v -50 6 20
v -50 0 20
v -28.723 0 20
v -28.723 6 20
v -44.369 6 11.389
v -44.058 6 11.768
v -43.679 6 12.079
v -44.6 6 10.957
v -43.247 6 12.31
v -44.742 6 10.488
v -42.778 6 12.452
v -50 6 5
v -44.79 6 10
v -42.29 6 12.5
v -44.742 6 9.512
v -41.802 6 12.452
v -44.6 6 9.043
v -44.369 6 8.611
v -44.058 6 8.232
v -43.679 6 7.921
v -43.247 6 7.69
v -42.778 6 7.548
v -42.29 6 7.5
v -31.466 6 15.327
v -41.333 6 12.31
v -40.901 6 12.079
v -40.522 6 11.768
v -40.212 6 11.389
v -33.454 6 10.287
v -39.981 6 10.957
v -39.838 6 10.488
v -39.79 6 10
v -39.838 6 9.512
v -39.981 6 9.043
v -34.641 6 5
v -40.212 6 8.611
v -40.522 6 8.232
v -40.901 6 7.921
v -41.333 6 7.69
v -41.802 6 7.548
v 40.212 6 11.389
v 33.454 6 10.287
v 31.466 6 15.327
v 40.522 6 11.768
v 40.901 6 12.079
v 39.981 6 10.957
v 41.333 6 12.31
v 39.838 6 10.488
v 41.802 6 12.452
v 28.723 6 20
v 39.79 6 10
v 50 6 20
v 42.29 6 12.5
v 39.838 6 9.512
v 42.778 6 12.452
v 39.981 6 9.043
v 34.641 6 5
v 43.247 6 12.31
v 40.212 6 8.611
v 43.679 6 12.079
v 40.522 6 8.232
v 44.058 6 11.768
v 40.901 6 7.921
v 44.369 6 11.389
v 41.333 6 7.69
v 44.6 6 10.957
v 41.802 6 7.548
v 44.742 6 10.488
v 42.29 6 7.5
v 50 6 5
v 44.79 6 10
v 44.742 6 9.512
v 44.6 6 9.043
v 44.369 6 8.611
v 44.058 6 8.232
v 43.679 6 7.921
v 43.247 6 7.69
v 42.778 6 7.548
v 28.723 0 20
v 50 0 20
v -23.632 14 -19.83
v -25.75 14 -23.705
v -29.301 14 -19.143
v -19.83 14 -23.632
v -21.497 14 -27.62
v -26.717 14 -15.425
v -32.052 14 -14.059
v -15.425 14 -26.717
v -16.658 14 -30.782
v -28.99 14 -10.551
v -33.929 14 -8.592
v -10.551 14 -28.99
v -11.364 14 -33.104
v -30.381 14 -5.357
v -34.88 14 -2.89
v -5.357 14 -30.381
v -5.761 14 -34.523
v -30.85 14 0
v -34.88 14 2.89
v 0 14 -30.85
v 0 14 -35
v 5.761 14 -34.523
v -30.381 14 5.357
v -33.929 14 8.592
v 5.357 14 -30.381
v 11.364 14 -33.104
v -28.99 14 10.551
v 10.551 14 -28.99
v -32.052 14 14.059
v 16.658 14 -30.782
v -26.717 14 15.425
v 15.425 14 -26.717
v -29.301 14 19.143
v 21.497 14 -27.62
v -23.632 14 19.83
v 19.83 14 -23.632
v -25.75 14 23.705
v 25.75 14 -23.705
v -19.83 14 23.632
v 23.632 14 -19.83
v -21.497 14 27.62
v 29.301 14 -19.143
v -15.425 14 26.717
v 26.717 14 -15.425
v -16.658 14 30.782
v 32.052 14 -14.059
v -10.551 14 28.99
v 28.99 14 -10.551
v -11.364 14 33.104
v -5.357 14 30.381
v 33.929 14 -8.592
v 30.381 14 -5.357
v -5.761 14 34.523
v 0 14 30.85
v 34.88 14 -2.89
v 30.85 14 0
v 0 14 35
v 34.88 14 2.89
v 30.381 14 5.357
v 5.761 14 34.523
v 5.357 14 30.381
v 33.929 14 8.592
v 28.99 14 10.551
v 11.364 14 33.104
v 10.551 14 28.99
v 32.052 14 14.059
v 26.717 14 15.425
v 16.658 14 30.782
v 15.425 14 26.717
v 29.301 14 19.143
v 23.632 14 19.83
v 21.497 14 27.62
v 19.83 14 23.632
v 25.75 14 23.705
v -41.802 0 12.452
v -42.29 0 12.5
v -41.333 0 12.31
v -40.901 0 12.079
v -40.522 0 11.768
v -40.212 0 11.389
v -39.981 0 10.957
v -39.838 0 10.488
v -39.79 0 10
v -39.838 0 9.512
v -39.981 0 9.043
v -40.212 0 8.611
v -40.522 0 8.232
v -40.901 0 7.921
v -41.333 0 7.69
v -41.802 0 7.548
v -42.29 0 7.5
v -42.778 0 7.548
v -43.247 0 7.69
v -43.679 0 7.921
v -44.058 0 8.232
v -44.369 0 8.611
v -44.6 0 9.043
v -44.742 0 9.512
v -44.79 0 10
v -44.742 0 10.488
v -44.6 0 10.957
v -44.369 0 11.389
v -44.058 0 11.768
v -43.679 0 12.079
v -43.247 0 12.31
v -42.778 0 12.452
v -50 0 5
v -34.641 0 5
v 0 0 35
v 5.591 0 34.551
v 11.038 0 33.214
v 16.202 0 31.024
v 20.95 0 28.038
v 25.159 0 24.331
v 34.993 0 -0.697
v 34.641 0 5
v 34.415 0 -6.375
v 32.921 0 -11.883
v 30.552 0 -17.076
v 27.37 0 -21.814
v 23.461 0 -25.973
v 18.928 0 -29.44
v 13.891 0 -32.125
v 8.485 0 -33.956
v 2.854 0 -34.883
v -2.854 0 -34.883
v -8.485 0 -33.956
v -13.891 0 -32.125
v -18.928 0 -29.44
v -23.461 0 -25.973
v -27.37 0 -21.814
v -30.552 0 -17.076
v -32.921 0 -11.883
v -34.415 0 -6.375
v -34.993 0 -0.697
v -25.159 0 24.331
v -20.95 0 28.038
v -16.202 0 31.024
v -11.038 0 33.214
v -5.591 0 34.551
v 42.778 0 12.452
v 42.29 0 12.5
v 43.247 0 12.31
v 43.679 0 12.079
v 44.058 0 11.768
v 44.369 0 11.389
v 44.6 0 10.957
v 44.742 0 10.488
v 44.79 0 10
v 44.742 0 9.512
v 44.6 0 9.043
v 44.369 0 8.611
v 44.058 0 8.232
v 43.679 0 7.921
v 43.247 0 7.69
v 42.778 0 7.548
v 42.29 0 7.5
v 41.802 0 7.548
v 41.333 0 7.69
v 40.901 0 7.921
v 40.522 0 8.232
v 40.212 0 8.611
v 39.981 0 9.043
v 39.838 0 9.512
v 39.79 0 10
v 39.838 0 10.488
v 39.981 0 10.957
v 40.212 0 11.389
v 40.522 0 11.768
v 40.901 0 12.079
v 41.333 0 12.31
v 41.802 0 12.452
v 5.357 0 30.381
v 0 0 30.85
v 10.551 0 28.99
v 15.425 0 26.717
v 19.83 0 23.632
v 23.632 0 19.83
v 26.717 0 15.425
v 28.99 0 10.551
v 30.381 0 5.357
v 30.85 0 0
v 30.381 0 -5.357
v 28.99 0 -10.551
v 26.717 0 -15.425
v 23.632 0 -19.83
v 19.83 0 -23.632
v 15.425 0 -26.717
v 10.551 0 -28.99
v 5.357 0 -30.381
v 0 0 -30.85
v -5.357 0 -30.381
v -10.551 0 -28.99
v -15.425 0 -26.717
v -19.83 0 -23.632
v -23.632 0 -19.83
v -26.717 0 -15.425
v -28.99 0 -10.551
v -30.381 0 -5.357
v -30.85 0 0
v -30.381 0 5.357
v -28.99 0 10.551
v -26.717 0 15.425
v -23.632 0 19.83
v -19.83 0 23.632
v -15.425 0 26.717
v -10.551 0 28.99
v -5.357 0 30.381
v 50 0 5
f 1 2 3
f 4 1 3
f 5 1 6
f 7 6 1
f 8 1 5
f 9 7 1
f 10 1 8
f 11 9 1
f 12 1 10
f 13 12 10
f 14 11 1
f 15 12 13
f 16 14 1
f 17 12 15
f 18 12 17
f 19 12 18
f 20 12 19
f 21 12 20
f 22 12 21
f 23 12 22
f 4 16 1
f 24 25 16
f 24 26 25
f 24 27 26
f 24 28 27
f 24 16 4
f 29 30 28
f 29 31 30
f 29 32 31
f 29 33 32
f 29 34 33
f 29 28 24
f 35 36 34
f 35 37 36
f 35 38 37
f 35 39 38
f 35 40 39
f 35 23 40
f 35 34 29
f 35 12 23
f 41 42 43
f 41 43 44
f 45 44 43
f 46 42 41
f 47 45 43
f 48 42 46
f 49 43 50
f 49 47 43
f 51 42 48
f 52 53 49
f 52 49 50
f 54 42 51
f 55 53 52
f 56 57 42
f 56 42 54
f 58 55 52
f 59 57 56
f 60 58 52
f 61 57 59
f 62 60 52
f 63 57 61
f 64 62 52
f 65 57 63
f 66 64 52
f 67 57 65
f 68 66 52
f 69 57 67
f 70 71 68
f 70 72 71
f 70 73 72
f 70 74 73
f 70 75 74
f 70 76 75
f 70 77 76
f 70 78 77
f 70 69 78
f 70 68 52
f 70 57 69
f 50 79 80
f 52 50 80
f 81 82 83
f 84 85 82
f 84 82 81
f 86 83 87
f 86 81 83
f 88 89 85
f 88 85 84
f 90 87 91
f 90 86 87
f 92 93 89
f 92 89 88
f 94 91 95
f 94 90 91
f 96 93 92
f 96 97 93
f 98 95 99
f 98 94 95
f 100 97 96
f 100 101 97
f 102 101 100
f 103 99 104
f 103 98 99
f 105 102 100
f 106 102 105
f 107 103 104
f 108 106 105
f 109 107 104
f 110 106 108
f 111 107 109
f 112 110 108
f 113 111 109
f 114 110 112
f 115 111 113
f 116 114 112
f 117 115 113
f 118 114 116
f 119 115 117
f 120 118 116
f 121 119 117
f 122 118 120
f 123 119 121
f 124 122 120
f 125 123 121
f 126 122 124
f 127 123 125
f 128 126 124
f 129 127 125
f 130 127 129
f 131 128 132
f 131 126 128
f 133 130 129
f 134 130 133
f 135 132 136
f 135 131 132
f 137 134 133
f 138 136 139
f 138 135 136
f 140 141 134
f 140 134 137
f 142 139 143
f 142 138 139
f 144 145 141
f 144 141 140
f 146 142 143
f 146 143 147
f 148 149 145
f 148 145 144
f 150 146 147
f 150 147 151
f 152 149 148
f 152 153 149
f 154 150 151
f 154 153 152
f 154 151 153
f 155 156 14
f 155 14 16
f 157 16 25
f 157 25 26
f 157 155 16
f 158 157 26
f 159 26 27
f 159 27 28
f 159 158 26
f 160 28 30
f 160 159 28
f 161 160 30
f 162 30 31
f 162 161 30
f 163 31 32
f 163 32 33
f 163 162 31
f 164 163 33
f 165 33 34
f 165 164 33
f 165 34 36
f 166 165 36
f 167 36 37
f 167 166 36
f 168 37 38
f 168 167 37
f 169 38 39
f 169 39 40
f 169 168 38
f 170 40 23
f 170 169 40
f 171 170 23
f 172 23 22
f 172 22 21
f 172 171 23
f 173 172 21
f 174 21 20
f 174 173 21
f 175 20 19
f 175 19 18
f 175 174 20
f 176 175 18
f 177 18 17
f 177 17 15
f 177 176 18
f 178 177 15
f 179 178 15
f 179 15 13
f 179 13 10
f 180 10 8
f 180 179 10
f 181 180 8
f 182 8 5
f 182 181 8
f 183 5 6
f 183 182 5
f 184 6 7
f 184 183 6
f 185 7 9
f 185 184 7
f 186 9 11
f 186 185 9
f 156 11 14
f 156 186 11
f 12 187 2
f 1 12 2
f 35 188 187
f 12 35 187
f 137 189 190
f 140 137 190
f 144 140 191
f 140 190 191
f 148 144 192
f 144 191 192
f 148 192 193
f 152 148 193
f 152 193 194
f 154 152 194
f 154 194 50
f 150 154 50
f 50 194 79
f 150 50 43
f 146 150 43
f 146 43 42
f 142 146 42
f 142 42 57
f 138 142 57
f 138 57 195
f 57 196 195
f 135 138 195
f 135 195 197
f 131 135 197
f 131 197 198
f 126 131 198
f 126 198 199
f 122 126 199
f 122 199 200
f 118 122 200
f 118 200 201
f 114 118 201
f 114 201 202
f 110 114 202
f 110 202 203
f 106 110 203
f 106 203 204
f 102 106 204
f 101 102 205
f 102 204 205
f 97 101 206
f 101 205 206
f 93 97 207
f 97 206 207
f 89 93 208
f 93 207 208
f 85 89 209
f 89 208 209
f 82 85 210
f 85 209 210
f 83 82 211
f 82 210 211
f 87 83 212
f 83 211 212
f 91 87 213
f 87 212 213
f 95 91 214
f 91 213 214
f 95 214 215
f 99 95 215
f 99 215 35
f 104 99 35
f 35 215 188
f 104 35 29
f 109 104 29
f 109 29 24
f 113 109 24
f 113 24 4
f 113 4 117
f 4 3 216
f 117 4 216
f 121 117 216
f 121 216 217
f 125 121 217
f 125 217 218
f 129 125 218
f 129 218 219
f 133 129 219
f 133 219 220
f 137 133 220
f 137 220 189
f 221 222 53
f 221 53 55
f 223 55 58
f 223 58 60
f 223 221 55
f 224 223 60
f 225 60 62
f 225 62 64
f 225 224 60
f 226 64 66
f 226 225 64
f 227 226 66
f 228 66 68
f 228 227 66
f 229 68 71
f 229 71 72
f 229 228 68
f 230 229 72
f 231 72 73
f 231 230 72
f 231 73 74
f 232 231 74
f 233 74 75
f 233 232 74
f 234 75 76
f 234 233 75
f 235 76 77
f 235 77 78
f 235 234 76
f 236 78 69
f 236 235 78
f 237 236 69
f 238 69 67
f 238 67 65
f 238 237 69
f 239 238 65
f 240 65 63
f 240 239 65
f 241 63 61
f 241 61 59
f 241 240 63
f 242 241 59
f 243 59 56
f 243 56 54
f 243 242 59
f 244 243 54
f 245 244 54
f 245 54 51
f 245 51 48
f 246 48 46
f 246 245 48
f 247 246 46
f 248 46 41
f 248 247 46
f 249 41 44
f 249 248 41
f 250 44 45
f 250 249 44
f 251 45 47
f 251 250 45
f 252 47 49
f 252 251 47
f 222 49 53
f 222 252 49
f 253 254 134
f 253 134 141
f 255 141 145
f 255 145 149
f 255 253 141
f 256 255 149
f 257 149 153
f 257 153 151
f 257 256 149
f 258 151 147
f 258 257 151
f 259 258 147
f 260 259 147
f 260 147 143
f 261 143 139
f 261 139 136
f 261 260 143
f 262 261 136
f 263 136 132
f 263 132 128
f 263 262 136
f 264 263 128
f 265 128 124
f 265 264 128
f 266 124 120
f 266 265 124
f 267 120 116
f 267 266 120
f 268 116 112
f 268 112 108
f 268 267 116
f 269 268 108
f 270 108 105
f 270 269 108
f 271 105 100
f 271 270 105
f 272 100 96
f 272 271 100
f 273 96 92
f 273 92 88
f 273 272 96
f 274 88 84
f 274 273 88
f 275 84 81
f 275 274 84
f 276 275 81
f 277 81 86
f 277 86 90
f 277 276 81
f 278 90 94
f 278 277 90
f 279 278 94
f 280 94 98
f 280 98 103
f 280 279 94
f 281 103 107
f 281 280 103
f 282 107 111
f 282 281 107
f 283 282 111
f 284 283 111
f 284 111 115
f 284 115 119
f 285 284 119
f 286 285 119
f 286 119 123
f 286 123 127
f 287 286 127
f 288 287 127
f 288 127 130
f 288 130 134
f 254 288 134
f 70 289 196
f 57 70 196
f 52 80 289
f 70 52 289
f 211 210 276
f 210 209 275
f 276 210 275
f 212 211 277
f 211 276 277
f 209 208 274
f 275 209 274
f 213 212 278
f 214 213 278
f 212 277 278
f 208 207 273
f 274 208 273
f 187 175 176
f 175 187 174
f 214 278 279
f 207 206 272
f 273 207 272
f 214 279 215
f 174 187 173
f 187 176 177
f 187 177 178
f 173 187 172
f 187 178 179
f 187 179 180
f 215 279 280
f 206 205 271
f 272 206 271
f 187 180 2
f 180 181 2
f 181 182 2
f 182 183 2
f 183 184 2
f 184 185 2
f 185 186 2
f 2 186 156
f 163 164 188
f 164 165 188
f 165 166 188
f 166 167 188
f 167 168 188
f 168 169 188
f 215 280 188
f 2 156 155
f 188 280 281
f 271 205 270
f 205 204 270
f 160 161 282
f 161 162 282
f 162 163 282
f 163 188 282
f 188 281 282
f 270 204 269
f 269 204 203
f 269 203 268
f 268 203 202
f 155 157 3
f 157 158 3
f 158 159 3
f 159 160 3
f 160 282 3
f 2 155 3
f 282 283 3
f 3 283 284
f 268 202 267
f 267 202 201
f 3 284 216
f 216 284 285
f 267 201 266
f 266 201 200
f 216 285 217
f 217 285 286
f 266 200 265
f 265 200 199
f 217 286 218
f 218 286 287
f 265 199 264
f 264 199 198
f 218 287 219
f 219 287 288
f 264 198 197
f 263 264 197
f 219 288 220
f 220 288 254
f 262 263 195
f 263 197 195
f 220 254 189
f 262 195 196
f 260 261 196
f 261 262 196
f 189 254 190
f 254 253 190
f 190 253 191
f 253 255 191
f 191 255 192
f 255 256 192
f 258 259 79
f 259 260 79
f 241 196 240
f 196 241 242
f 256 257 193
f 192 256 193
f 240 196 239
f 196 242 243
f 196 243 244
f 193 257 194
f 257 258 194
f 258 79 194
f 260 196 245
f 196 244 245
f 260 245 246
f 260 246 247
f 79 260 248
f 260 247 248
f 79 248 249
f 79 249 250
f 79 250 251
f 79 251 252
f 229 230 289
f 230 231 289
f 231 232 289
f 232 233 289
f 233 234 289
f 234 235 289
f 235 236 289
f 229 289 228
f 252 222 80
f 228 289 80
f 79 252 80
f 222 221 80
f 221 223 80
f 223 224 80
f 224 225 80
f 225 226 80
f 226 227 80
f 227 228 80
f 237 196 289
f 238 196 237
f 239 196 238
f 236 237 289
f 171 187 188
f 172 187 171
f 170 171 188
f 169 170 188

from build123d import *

# Parameters (mm, degrees)
SKETCH_1_R      = 30.85
EXTRUDE_1_DEPTH = 14
SKETCH_1_3_R    = 2.5
EXTRUDE_2_DEPTH = 6
SKETCH_1_4_R    = 2.5
EXTRUDE_3_DEPTH = 6


with BuildPart() as part:
    # 草图1 → 凸台-拉伸1 (new body)
    with BuildSketch(Plane(origin=(0, 0, 0), x_dir=(1, 0, 0), z_dir=(0, 1, 0))):
        with BuildLine():
            ThreePointArc((34.641016151, -5), (34.91013868, -2.506435188), (35, 0))
            ThreePointArc((35, 0), (0, 35), (-35, 0))
            ThreePointArc((-35, 0), (-34.91013868, -2.506435188), (-34.641016151, -5))
            ThreePointArc((-34.641016151, -5), (-32.557544726, -12.845477081), (-28.722813233, -20))
            ThreePointArc((-28.722813233, -20), (-26.7260394, -22.599088876), (-24.494897428, -25))
            ThreePointArc((-24.494897428, -25), (0, -35), (24.494897428, -25))
            ThreePointArc((24.494897428, -25), (26.7260394, -22.599088876), (28.722813233, -20))
            ThreePointArc((28.722813233, -20), (32.557544726, -12.845477081), (34.641016151, -5))
        make_face()
        Circle(SKETCH_1_R, mode=Mode.SUBTRACT)
    extrude(amount=EXTRUDE_1_DEPTH)

    # 草图1<3> → 凸台-拉伸2 (add)
    with BuildSketch(Plane(origin=(0, 0, 0), x_dir=(1, 0, 0), z_dir=(0, 1, 0))):
        with BuildLine():
            Line((50, -5), (34.641016151, -5))
            ThreePointArc((34.641016151, -5), (32.557544726, -12.845477081), (28.722813233, -20))
            Line((28.722813233, -20), (50, -20))
            Line((50, -20), (50, -5))
        make_face()
        with Locations((42.290199458, -10)):
            Circle(SKETCH_1_3_R, mode=Mode.SUBTRACT)
    extrude(amount=EXTRUDE_2_DEPTH)

    # 草图1<4> → 凸台-拉伸3 (add)
    with BuildSketch(Plane(origin=(0, 0, 0), x_dir=(1, 0, 0), z_dir=(0, 1, 0))):
        with BuildLine():
            ThreePointArc((-28.722813233, -20), (-32.557544726, -12.845477081), (-34.641016151, -5))
            Line((-34.641016151, -5), (-50, -5))
            Line((-50, -5), (-50, -20))
            Line((-50, -20), (-28.722813233, -20))
        make_face()
        with Locations((-42.290199458, -10)):
            Circle(SKETCH_1_4_R, mode=Mode.SUBTRACT)
    extrude(amount=EXTRUDE_3_DEPTH)


solid = part.part
